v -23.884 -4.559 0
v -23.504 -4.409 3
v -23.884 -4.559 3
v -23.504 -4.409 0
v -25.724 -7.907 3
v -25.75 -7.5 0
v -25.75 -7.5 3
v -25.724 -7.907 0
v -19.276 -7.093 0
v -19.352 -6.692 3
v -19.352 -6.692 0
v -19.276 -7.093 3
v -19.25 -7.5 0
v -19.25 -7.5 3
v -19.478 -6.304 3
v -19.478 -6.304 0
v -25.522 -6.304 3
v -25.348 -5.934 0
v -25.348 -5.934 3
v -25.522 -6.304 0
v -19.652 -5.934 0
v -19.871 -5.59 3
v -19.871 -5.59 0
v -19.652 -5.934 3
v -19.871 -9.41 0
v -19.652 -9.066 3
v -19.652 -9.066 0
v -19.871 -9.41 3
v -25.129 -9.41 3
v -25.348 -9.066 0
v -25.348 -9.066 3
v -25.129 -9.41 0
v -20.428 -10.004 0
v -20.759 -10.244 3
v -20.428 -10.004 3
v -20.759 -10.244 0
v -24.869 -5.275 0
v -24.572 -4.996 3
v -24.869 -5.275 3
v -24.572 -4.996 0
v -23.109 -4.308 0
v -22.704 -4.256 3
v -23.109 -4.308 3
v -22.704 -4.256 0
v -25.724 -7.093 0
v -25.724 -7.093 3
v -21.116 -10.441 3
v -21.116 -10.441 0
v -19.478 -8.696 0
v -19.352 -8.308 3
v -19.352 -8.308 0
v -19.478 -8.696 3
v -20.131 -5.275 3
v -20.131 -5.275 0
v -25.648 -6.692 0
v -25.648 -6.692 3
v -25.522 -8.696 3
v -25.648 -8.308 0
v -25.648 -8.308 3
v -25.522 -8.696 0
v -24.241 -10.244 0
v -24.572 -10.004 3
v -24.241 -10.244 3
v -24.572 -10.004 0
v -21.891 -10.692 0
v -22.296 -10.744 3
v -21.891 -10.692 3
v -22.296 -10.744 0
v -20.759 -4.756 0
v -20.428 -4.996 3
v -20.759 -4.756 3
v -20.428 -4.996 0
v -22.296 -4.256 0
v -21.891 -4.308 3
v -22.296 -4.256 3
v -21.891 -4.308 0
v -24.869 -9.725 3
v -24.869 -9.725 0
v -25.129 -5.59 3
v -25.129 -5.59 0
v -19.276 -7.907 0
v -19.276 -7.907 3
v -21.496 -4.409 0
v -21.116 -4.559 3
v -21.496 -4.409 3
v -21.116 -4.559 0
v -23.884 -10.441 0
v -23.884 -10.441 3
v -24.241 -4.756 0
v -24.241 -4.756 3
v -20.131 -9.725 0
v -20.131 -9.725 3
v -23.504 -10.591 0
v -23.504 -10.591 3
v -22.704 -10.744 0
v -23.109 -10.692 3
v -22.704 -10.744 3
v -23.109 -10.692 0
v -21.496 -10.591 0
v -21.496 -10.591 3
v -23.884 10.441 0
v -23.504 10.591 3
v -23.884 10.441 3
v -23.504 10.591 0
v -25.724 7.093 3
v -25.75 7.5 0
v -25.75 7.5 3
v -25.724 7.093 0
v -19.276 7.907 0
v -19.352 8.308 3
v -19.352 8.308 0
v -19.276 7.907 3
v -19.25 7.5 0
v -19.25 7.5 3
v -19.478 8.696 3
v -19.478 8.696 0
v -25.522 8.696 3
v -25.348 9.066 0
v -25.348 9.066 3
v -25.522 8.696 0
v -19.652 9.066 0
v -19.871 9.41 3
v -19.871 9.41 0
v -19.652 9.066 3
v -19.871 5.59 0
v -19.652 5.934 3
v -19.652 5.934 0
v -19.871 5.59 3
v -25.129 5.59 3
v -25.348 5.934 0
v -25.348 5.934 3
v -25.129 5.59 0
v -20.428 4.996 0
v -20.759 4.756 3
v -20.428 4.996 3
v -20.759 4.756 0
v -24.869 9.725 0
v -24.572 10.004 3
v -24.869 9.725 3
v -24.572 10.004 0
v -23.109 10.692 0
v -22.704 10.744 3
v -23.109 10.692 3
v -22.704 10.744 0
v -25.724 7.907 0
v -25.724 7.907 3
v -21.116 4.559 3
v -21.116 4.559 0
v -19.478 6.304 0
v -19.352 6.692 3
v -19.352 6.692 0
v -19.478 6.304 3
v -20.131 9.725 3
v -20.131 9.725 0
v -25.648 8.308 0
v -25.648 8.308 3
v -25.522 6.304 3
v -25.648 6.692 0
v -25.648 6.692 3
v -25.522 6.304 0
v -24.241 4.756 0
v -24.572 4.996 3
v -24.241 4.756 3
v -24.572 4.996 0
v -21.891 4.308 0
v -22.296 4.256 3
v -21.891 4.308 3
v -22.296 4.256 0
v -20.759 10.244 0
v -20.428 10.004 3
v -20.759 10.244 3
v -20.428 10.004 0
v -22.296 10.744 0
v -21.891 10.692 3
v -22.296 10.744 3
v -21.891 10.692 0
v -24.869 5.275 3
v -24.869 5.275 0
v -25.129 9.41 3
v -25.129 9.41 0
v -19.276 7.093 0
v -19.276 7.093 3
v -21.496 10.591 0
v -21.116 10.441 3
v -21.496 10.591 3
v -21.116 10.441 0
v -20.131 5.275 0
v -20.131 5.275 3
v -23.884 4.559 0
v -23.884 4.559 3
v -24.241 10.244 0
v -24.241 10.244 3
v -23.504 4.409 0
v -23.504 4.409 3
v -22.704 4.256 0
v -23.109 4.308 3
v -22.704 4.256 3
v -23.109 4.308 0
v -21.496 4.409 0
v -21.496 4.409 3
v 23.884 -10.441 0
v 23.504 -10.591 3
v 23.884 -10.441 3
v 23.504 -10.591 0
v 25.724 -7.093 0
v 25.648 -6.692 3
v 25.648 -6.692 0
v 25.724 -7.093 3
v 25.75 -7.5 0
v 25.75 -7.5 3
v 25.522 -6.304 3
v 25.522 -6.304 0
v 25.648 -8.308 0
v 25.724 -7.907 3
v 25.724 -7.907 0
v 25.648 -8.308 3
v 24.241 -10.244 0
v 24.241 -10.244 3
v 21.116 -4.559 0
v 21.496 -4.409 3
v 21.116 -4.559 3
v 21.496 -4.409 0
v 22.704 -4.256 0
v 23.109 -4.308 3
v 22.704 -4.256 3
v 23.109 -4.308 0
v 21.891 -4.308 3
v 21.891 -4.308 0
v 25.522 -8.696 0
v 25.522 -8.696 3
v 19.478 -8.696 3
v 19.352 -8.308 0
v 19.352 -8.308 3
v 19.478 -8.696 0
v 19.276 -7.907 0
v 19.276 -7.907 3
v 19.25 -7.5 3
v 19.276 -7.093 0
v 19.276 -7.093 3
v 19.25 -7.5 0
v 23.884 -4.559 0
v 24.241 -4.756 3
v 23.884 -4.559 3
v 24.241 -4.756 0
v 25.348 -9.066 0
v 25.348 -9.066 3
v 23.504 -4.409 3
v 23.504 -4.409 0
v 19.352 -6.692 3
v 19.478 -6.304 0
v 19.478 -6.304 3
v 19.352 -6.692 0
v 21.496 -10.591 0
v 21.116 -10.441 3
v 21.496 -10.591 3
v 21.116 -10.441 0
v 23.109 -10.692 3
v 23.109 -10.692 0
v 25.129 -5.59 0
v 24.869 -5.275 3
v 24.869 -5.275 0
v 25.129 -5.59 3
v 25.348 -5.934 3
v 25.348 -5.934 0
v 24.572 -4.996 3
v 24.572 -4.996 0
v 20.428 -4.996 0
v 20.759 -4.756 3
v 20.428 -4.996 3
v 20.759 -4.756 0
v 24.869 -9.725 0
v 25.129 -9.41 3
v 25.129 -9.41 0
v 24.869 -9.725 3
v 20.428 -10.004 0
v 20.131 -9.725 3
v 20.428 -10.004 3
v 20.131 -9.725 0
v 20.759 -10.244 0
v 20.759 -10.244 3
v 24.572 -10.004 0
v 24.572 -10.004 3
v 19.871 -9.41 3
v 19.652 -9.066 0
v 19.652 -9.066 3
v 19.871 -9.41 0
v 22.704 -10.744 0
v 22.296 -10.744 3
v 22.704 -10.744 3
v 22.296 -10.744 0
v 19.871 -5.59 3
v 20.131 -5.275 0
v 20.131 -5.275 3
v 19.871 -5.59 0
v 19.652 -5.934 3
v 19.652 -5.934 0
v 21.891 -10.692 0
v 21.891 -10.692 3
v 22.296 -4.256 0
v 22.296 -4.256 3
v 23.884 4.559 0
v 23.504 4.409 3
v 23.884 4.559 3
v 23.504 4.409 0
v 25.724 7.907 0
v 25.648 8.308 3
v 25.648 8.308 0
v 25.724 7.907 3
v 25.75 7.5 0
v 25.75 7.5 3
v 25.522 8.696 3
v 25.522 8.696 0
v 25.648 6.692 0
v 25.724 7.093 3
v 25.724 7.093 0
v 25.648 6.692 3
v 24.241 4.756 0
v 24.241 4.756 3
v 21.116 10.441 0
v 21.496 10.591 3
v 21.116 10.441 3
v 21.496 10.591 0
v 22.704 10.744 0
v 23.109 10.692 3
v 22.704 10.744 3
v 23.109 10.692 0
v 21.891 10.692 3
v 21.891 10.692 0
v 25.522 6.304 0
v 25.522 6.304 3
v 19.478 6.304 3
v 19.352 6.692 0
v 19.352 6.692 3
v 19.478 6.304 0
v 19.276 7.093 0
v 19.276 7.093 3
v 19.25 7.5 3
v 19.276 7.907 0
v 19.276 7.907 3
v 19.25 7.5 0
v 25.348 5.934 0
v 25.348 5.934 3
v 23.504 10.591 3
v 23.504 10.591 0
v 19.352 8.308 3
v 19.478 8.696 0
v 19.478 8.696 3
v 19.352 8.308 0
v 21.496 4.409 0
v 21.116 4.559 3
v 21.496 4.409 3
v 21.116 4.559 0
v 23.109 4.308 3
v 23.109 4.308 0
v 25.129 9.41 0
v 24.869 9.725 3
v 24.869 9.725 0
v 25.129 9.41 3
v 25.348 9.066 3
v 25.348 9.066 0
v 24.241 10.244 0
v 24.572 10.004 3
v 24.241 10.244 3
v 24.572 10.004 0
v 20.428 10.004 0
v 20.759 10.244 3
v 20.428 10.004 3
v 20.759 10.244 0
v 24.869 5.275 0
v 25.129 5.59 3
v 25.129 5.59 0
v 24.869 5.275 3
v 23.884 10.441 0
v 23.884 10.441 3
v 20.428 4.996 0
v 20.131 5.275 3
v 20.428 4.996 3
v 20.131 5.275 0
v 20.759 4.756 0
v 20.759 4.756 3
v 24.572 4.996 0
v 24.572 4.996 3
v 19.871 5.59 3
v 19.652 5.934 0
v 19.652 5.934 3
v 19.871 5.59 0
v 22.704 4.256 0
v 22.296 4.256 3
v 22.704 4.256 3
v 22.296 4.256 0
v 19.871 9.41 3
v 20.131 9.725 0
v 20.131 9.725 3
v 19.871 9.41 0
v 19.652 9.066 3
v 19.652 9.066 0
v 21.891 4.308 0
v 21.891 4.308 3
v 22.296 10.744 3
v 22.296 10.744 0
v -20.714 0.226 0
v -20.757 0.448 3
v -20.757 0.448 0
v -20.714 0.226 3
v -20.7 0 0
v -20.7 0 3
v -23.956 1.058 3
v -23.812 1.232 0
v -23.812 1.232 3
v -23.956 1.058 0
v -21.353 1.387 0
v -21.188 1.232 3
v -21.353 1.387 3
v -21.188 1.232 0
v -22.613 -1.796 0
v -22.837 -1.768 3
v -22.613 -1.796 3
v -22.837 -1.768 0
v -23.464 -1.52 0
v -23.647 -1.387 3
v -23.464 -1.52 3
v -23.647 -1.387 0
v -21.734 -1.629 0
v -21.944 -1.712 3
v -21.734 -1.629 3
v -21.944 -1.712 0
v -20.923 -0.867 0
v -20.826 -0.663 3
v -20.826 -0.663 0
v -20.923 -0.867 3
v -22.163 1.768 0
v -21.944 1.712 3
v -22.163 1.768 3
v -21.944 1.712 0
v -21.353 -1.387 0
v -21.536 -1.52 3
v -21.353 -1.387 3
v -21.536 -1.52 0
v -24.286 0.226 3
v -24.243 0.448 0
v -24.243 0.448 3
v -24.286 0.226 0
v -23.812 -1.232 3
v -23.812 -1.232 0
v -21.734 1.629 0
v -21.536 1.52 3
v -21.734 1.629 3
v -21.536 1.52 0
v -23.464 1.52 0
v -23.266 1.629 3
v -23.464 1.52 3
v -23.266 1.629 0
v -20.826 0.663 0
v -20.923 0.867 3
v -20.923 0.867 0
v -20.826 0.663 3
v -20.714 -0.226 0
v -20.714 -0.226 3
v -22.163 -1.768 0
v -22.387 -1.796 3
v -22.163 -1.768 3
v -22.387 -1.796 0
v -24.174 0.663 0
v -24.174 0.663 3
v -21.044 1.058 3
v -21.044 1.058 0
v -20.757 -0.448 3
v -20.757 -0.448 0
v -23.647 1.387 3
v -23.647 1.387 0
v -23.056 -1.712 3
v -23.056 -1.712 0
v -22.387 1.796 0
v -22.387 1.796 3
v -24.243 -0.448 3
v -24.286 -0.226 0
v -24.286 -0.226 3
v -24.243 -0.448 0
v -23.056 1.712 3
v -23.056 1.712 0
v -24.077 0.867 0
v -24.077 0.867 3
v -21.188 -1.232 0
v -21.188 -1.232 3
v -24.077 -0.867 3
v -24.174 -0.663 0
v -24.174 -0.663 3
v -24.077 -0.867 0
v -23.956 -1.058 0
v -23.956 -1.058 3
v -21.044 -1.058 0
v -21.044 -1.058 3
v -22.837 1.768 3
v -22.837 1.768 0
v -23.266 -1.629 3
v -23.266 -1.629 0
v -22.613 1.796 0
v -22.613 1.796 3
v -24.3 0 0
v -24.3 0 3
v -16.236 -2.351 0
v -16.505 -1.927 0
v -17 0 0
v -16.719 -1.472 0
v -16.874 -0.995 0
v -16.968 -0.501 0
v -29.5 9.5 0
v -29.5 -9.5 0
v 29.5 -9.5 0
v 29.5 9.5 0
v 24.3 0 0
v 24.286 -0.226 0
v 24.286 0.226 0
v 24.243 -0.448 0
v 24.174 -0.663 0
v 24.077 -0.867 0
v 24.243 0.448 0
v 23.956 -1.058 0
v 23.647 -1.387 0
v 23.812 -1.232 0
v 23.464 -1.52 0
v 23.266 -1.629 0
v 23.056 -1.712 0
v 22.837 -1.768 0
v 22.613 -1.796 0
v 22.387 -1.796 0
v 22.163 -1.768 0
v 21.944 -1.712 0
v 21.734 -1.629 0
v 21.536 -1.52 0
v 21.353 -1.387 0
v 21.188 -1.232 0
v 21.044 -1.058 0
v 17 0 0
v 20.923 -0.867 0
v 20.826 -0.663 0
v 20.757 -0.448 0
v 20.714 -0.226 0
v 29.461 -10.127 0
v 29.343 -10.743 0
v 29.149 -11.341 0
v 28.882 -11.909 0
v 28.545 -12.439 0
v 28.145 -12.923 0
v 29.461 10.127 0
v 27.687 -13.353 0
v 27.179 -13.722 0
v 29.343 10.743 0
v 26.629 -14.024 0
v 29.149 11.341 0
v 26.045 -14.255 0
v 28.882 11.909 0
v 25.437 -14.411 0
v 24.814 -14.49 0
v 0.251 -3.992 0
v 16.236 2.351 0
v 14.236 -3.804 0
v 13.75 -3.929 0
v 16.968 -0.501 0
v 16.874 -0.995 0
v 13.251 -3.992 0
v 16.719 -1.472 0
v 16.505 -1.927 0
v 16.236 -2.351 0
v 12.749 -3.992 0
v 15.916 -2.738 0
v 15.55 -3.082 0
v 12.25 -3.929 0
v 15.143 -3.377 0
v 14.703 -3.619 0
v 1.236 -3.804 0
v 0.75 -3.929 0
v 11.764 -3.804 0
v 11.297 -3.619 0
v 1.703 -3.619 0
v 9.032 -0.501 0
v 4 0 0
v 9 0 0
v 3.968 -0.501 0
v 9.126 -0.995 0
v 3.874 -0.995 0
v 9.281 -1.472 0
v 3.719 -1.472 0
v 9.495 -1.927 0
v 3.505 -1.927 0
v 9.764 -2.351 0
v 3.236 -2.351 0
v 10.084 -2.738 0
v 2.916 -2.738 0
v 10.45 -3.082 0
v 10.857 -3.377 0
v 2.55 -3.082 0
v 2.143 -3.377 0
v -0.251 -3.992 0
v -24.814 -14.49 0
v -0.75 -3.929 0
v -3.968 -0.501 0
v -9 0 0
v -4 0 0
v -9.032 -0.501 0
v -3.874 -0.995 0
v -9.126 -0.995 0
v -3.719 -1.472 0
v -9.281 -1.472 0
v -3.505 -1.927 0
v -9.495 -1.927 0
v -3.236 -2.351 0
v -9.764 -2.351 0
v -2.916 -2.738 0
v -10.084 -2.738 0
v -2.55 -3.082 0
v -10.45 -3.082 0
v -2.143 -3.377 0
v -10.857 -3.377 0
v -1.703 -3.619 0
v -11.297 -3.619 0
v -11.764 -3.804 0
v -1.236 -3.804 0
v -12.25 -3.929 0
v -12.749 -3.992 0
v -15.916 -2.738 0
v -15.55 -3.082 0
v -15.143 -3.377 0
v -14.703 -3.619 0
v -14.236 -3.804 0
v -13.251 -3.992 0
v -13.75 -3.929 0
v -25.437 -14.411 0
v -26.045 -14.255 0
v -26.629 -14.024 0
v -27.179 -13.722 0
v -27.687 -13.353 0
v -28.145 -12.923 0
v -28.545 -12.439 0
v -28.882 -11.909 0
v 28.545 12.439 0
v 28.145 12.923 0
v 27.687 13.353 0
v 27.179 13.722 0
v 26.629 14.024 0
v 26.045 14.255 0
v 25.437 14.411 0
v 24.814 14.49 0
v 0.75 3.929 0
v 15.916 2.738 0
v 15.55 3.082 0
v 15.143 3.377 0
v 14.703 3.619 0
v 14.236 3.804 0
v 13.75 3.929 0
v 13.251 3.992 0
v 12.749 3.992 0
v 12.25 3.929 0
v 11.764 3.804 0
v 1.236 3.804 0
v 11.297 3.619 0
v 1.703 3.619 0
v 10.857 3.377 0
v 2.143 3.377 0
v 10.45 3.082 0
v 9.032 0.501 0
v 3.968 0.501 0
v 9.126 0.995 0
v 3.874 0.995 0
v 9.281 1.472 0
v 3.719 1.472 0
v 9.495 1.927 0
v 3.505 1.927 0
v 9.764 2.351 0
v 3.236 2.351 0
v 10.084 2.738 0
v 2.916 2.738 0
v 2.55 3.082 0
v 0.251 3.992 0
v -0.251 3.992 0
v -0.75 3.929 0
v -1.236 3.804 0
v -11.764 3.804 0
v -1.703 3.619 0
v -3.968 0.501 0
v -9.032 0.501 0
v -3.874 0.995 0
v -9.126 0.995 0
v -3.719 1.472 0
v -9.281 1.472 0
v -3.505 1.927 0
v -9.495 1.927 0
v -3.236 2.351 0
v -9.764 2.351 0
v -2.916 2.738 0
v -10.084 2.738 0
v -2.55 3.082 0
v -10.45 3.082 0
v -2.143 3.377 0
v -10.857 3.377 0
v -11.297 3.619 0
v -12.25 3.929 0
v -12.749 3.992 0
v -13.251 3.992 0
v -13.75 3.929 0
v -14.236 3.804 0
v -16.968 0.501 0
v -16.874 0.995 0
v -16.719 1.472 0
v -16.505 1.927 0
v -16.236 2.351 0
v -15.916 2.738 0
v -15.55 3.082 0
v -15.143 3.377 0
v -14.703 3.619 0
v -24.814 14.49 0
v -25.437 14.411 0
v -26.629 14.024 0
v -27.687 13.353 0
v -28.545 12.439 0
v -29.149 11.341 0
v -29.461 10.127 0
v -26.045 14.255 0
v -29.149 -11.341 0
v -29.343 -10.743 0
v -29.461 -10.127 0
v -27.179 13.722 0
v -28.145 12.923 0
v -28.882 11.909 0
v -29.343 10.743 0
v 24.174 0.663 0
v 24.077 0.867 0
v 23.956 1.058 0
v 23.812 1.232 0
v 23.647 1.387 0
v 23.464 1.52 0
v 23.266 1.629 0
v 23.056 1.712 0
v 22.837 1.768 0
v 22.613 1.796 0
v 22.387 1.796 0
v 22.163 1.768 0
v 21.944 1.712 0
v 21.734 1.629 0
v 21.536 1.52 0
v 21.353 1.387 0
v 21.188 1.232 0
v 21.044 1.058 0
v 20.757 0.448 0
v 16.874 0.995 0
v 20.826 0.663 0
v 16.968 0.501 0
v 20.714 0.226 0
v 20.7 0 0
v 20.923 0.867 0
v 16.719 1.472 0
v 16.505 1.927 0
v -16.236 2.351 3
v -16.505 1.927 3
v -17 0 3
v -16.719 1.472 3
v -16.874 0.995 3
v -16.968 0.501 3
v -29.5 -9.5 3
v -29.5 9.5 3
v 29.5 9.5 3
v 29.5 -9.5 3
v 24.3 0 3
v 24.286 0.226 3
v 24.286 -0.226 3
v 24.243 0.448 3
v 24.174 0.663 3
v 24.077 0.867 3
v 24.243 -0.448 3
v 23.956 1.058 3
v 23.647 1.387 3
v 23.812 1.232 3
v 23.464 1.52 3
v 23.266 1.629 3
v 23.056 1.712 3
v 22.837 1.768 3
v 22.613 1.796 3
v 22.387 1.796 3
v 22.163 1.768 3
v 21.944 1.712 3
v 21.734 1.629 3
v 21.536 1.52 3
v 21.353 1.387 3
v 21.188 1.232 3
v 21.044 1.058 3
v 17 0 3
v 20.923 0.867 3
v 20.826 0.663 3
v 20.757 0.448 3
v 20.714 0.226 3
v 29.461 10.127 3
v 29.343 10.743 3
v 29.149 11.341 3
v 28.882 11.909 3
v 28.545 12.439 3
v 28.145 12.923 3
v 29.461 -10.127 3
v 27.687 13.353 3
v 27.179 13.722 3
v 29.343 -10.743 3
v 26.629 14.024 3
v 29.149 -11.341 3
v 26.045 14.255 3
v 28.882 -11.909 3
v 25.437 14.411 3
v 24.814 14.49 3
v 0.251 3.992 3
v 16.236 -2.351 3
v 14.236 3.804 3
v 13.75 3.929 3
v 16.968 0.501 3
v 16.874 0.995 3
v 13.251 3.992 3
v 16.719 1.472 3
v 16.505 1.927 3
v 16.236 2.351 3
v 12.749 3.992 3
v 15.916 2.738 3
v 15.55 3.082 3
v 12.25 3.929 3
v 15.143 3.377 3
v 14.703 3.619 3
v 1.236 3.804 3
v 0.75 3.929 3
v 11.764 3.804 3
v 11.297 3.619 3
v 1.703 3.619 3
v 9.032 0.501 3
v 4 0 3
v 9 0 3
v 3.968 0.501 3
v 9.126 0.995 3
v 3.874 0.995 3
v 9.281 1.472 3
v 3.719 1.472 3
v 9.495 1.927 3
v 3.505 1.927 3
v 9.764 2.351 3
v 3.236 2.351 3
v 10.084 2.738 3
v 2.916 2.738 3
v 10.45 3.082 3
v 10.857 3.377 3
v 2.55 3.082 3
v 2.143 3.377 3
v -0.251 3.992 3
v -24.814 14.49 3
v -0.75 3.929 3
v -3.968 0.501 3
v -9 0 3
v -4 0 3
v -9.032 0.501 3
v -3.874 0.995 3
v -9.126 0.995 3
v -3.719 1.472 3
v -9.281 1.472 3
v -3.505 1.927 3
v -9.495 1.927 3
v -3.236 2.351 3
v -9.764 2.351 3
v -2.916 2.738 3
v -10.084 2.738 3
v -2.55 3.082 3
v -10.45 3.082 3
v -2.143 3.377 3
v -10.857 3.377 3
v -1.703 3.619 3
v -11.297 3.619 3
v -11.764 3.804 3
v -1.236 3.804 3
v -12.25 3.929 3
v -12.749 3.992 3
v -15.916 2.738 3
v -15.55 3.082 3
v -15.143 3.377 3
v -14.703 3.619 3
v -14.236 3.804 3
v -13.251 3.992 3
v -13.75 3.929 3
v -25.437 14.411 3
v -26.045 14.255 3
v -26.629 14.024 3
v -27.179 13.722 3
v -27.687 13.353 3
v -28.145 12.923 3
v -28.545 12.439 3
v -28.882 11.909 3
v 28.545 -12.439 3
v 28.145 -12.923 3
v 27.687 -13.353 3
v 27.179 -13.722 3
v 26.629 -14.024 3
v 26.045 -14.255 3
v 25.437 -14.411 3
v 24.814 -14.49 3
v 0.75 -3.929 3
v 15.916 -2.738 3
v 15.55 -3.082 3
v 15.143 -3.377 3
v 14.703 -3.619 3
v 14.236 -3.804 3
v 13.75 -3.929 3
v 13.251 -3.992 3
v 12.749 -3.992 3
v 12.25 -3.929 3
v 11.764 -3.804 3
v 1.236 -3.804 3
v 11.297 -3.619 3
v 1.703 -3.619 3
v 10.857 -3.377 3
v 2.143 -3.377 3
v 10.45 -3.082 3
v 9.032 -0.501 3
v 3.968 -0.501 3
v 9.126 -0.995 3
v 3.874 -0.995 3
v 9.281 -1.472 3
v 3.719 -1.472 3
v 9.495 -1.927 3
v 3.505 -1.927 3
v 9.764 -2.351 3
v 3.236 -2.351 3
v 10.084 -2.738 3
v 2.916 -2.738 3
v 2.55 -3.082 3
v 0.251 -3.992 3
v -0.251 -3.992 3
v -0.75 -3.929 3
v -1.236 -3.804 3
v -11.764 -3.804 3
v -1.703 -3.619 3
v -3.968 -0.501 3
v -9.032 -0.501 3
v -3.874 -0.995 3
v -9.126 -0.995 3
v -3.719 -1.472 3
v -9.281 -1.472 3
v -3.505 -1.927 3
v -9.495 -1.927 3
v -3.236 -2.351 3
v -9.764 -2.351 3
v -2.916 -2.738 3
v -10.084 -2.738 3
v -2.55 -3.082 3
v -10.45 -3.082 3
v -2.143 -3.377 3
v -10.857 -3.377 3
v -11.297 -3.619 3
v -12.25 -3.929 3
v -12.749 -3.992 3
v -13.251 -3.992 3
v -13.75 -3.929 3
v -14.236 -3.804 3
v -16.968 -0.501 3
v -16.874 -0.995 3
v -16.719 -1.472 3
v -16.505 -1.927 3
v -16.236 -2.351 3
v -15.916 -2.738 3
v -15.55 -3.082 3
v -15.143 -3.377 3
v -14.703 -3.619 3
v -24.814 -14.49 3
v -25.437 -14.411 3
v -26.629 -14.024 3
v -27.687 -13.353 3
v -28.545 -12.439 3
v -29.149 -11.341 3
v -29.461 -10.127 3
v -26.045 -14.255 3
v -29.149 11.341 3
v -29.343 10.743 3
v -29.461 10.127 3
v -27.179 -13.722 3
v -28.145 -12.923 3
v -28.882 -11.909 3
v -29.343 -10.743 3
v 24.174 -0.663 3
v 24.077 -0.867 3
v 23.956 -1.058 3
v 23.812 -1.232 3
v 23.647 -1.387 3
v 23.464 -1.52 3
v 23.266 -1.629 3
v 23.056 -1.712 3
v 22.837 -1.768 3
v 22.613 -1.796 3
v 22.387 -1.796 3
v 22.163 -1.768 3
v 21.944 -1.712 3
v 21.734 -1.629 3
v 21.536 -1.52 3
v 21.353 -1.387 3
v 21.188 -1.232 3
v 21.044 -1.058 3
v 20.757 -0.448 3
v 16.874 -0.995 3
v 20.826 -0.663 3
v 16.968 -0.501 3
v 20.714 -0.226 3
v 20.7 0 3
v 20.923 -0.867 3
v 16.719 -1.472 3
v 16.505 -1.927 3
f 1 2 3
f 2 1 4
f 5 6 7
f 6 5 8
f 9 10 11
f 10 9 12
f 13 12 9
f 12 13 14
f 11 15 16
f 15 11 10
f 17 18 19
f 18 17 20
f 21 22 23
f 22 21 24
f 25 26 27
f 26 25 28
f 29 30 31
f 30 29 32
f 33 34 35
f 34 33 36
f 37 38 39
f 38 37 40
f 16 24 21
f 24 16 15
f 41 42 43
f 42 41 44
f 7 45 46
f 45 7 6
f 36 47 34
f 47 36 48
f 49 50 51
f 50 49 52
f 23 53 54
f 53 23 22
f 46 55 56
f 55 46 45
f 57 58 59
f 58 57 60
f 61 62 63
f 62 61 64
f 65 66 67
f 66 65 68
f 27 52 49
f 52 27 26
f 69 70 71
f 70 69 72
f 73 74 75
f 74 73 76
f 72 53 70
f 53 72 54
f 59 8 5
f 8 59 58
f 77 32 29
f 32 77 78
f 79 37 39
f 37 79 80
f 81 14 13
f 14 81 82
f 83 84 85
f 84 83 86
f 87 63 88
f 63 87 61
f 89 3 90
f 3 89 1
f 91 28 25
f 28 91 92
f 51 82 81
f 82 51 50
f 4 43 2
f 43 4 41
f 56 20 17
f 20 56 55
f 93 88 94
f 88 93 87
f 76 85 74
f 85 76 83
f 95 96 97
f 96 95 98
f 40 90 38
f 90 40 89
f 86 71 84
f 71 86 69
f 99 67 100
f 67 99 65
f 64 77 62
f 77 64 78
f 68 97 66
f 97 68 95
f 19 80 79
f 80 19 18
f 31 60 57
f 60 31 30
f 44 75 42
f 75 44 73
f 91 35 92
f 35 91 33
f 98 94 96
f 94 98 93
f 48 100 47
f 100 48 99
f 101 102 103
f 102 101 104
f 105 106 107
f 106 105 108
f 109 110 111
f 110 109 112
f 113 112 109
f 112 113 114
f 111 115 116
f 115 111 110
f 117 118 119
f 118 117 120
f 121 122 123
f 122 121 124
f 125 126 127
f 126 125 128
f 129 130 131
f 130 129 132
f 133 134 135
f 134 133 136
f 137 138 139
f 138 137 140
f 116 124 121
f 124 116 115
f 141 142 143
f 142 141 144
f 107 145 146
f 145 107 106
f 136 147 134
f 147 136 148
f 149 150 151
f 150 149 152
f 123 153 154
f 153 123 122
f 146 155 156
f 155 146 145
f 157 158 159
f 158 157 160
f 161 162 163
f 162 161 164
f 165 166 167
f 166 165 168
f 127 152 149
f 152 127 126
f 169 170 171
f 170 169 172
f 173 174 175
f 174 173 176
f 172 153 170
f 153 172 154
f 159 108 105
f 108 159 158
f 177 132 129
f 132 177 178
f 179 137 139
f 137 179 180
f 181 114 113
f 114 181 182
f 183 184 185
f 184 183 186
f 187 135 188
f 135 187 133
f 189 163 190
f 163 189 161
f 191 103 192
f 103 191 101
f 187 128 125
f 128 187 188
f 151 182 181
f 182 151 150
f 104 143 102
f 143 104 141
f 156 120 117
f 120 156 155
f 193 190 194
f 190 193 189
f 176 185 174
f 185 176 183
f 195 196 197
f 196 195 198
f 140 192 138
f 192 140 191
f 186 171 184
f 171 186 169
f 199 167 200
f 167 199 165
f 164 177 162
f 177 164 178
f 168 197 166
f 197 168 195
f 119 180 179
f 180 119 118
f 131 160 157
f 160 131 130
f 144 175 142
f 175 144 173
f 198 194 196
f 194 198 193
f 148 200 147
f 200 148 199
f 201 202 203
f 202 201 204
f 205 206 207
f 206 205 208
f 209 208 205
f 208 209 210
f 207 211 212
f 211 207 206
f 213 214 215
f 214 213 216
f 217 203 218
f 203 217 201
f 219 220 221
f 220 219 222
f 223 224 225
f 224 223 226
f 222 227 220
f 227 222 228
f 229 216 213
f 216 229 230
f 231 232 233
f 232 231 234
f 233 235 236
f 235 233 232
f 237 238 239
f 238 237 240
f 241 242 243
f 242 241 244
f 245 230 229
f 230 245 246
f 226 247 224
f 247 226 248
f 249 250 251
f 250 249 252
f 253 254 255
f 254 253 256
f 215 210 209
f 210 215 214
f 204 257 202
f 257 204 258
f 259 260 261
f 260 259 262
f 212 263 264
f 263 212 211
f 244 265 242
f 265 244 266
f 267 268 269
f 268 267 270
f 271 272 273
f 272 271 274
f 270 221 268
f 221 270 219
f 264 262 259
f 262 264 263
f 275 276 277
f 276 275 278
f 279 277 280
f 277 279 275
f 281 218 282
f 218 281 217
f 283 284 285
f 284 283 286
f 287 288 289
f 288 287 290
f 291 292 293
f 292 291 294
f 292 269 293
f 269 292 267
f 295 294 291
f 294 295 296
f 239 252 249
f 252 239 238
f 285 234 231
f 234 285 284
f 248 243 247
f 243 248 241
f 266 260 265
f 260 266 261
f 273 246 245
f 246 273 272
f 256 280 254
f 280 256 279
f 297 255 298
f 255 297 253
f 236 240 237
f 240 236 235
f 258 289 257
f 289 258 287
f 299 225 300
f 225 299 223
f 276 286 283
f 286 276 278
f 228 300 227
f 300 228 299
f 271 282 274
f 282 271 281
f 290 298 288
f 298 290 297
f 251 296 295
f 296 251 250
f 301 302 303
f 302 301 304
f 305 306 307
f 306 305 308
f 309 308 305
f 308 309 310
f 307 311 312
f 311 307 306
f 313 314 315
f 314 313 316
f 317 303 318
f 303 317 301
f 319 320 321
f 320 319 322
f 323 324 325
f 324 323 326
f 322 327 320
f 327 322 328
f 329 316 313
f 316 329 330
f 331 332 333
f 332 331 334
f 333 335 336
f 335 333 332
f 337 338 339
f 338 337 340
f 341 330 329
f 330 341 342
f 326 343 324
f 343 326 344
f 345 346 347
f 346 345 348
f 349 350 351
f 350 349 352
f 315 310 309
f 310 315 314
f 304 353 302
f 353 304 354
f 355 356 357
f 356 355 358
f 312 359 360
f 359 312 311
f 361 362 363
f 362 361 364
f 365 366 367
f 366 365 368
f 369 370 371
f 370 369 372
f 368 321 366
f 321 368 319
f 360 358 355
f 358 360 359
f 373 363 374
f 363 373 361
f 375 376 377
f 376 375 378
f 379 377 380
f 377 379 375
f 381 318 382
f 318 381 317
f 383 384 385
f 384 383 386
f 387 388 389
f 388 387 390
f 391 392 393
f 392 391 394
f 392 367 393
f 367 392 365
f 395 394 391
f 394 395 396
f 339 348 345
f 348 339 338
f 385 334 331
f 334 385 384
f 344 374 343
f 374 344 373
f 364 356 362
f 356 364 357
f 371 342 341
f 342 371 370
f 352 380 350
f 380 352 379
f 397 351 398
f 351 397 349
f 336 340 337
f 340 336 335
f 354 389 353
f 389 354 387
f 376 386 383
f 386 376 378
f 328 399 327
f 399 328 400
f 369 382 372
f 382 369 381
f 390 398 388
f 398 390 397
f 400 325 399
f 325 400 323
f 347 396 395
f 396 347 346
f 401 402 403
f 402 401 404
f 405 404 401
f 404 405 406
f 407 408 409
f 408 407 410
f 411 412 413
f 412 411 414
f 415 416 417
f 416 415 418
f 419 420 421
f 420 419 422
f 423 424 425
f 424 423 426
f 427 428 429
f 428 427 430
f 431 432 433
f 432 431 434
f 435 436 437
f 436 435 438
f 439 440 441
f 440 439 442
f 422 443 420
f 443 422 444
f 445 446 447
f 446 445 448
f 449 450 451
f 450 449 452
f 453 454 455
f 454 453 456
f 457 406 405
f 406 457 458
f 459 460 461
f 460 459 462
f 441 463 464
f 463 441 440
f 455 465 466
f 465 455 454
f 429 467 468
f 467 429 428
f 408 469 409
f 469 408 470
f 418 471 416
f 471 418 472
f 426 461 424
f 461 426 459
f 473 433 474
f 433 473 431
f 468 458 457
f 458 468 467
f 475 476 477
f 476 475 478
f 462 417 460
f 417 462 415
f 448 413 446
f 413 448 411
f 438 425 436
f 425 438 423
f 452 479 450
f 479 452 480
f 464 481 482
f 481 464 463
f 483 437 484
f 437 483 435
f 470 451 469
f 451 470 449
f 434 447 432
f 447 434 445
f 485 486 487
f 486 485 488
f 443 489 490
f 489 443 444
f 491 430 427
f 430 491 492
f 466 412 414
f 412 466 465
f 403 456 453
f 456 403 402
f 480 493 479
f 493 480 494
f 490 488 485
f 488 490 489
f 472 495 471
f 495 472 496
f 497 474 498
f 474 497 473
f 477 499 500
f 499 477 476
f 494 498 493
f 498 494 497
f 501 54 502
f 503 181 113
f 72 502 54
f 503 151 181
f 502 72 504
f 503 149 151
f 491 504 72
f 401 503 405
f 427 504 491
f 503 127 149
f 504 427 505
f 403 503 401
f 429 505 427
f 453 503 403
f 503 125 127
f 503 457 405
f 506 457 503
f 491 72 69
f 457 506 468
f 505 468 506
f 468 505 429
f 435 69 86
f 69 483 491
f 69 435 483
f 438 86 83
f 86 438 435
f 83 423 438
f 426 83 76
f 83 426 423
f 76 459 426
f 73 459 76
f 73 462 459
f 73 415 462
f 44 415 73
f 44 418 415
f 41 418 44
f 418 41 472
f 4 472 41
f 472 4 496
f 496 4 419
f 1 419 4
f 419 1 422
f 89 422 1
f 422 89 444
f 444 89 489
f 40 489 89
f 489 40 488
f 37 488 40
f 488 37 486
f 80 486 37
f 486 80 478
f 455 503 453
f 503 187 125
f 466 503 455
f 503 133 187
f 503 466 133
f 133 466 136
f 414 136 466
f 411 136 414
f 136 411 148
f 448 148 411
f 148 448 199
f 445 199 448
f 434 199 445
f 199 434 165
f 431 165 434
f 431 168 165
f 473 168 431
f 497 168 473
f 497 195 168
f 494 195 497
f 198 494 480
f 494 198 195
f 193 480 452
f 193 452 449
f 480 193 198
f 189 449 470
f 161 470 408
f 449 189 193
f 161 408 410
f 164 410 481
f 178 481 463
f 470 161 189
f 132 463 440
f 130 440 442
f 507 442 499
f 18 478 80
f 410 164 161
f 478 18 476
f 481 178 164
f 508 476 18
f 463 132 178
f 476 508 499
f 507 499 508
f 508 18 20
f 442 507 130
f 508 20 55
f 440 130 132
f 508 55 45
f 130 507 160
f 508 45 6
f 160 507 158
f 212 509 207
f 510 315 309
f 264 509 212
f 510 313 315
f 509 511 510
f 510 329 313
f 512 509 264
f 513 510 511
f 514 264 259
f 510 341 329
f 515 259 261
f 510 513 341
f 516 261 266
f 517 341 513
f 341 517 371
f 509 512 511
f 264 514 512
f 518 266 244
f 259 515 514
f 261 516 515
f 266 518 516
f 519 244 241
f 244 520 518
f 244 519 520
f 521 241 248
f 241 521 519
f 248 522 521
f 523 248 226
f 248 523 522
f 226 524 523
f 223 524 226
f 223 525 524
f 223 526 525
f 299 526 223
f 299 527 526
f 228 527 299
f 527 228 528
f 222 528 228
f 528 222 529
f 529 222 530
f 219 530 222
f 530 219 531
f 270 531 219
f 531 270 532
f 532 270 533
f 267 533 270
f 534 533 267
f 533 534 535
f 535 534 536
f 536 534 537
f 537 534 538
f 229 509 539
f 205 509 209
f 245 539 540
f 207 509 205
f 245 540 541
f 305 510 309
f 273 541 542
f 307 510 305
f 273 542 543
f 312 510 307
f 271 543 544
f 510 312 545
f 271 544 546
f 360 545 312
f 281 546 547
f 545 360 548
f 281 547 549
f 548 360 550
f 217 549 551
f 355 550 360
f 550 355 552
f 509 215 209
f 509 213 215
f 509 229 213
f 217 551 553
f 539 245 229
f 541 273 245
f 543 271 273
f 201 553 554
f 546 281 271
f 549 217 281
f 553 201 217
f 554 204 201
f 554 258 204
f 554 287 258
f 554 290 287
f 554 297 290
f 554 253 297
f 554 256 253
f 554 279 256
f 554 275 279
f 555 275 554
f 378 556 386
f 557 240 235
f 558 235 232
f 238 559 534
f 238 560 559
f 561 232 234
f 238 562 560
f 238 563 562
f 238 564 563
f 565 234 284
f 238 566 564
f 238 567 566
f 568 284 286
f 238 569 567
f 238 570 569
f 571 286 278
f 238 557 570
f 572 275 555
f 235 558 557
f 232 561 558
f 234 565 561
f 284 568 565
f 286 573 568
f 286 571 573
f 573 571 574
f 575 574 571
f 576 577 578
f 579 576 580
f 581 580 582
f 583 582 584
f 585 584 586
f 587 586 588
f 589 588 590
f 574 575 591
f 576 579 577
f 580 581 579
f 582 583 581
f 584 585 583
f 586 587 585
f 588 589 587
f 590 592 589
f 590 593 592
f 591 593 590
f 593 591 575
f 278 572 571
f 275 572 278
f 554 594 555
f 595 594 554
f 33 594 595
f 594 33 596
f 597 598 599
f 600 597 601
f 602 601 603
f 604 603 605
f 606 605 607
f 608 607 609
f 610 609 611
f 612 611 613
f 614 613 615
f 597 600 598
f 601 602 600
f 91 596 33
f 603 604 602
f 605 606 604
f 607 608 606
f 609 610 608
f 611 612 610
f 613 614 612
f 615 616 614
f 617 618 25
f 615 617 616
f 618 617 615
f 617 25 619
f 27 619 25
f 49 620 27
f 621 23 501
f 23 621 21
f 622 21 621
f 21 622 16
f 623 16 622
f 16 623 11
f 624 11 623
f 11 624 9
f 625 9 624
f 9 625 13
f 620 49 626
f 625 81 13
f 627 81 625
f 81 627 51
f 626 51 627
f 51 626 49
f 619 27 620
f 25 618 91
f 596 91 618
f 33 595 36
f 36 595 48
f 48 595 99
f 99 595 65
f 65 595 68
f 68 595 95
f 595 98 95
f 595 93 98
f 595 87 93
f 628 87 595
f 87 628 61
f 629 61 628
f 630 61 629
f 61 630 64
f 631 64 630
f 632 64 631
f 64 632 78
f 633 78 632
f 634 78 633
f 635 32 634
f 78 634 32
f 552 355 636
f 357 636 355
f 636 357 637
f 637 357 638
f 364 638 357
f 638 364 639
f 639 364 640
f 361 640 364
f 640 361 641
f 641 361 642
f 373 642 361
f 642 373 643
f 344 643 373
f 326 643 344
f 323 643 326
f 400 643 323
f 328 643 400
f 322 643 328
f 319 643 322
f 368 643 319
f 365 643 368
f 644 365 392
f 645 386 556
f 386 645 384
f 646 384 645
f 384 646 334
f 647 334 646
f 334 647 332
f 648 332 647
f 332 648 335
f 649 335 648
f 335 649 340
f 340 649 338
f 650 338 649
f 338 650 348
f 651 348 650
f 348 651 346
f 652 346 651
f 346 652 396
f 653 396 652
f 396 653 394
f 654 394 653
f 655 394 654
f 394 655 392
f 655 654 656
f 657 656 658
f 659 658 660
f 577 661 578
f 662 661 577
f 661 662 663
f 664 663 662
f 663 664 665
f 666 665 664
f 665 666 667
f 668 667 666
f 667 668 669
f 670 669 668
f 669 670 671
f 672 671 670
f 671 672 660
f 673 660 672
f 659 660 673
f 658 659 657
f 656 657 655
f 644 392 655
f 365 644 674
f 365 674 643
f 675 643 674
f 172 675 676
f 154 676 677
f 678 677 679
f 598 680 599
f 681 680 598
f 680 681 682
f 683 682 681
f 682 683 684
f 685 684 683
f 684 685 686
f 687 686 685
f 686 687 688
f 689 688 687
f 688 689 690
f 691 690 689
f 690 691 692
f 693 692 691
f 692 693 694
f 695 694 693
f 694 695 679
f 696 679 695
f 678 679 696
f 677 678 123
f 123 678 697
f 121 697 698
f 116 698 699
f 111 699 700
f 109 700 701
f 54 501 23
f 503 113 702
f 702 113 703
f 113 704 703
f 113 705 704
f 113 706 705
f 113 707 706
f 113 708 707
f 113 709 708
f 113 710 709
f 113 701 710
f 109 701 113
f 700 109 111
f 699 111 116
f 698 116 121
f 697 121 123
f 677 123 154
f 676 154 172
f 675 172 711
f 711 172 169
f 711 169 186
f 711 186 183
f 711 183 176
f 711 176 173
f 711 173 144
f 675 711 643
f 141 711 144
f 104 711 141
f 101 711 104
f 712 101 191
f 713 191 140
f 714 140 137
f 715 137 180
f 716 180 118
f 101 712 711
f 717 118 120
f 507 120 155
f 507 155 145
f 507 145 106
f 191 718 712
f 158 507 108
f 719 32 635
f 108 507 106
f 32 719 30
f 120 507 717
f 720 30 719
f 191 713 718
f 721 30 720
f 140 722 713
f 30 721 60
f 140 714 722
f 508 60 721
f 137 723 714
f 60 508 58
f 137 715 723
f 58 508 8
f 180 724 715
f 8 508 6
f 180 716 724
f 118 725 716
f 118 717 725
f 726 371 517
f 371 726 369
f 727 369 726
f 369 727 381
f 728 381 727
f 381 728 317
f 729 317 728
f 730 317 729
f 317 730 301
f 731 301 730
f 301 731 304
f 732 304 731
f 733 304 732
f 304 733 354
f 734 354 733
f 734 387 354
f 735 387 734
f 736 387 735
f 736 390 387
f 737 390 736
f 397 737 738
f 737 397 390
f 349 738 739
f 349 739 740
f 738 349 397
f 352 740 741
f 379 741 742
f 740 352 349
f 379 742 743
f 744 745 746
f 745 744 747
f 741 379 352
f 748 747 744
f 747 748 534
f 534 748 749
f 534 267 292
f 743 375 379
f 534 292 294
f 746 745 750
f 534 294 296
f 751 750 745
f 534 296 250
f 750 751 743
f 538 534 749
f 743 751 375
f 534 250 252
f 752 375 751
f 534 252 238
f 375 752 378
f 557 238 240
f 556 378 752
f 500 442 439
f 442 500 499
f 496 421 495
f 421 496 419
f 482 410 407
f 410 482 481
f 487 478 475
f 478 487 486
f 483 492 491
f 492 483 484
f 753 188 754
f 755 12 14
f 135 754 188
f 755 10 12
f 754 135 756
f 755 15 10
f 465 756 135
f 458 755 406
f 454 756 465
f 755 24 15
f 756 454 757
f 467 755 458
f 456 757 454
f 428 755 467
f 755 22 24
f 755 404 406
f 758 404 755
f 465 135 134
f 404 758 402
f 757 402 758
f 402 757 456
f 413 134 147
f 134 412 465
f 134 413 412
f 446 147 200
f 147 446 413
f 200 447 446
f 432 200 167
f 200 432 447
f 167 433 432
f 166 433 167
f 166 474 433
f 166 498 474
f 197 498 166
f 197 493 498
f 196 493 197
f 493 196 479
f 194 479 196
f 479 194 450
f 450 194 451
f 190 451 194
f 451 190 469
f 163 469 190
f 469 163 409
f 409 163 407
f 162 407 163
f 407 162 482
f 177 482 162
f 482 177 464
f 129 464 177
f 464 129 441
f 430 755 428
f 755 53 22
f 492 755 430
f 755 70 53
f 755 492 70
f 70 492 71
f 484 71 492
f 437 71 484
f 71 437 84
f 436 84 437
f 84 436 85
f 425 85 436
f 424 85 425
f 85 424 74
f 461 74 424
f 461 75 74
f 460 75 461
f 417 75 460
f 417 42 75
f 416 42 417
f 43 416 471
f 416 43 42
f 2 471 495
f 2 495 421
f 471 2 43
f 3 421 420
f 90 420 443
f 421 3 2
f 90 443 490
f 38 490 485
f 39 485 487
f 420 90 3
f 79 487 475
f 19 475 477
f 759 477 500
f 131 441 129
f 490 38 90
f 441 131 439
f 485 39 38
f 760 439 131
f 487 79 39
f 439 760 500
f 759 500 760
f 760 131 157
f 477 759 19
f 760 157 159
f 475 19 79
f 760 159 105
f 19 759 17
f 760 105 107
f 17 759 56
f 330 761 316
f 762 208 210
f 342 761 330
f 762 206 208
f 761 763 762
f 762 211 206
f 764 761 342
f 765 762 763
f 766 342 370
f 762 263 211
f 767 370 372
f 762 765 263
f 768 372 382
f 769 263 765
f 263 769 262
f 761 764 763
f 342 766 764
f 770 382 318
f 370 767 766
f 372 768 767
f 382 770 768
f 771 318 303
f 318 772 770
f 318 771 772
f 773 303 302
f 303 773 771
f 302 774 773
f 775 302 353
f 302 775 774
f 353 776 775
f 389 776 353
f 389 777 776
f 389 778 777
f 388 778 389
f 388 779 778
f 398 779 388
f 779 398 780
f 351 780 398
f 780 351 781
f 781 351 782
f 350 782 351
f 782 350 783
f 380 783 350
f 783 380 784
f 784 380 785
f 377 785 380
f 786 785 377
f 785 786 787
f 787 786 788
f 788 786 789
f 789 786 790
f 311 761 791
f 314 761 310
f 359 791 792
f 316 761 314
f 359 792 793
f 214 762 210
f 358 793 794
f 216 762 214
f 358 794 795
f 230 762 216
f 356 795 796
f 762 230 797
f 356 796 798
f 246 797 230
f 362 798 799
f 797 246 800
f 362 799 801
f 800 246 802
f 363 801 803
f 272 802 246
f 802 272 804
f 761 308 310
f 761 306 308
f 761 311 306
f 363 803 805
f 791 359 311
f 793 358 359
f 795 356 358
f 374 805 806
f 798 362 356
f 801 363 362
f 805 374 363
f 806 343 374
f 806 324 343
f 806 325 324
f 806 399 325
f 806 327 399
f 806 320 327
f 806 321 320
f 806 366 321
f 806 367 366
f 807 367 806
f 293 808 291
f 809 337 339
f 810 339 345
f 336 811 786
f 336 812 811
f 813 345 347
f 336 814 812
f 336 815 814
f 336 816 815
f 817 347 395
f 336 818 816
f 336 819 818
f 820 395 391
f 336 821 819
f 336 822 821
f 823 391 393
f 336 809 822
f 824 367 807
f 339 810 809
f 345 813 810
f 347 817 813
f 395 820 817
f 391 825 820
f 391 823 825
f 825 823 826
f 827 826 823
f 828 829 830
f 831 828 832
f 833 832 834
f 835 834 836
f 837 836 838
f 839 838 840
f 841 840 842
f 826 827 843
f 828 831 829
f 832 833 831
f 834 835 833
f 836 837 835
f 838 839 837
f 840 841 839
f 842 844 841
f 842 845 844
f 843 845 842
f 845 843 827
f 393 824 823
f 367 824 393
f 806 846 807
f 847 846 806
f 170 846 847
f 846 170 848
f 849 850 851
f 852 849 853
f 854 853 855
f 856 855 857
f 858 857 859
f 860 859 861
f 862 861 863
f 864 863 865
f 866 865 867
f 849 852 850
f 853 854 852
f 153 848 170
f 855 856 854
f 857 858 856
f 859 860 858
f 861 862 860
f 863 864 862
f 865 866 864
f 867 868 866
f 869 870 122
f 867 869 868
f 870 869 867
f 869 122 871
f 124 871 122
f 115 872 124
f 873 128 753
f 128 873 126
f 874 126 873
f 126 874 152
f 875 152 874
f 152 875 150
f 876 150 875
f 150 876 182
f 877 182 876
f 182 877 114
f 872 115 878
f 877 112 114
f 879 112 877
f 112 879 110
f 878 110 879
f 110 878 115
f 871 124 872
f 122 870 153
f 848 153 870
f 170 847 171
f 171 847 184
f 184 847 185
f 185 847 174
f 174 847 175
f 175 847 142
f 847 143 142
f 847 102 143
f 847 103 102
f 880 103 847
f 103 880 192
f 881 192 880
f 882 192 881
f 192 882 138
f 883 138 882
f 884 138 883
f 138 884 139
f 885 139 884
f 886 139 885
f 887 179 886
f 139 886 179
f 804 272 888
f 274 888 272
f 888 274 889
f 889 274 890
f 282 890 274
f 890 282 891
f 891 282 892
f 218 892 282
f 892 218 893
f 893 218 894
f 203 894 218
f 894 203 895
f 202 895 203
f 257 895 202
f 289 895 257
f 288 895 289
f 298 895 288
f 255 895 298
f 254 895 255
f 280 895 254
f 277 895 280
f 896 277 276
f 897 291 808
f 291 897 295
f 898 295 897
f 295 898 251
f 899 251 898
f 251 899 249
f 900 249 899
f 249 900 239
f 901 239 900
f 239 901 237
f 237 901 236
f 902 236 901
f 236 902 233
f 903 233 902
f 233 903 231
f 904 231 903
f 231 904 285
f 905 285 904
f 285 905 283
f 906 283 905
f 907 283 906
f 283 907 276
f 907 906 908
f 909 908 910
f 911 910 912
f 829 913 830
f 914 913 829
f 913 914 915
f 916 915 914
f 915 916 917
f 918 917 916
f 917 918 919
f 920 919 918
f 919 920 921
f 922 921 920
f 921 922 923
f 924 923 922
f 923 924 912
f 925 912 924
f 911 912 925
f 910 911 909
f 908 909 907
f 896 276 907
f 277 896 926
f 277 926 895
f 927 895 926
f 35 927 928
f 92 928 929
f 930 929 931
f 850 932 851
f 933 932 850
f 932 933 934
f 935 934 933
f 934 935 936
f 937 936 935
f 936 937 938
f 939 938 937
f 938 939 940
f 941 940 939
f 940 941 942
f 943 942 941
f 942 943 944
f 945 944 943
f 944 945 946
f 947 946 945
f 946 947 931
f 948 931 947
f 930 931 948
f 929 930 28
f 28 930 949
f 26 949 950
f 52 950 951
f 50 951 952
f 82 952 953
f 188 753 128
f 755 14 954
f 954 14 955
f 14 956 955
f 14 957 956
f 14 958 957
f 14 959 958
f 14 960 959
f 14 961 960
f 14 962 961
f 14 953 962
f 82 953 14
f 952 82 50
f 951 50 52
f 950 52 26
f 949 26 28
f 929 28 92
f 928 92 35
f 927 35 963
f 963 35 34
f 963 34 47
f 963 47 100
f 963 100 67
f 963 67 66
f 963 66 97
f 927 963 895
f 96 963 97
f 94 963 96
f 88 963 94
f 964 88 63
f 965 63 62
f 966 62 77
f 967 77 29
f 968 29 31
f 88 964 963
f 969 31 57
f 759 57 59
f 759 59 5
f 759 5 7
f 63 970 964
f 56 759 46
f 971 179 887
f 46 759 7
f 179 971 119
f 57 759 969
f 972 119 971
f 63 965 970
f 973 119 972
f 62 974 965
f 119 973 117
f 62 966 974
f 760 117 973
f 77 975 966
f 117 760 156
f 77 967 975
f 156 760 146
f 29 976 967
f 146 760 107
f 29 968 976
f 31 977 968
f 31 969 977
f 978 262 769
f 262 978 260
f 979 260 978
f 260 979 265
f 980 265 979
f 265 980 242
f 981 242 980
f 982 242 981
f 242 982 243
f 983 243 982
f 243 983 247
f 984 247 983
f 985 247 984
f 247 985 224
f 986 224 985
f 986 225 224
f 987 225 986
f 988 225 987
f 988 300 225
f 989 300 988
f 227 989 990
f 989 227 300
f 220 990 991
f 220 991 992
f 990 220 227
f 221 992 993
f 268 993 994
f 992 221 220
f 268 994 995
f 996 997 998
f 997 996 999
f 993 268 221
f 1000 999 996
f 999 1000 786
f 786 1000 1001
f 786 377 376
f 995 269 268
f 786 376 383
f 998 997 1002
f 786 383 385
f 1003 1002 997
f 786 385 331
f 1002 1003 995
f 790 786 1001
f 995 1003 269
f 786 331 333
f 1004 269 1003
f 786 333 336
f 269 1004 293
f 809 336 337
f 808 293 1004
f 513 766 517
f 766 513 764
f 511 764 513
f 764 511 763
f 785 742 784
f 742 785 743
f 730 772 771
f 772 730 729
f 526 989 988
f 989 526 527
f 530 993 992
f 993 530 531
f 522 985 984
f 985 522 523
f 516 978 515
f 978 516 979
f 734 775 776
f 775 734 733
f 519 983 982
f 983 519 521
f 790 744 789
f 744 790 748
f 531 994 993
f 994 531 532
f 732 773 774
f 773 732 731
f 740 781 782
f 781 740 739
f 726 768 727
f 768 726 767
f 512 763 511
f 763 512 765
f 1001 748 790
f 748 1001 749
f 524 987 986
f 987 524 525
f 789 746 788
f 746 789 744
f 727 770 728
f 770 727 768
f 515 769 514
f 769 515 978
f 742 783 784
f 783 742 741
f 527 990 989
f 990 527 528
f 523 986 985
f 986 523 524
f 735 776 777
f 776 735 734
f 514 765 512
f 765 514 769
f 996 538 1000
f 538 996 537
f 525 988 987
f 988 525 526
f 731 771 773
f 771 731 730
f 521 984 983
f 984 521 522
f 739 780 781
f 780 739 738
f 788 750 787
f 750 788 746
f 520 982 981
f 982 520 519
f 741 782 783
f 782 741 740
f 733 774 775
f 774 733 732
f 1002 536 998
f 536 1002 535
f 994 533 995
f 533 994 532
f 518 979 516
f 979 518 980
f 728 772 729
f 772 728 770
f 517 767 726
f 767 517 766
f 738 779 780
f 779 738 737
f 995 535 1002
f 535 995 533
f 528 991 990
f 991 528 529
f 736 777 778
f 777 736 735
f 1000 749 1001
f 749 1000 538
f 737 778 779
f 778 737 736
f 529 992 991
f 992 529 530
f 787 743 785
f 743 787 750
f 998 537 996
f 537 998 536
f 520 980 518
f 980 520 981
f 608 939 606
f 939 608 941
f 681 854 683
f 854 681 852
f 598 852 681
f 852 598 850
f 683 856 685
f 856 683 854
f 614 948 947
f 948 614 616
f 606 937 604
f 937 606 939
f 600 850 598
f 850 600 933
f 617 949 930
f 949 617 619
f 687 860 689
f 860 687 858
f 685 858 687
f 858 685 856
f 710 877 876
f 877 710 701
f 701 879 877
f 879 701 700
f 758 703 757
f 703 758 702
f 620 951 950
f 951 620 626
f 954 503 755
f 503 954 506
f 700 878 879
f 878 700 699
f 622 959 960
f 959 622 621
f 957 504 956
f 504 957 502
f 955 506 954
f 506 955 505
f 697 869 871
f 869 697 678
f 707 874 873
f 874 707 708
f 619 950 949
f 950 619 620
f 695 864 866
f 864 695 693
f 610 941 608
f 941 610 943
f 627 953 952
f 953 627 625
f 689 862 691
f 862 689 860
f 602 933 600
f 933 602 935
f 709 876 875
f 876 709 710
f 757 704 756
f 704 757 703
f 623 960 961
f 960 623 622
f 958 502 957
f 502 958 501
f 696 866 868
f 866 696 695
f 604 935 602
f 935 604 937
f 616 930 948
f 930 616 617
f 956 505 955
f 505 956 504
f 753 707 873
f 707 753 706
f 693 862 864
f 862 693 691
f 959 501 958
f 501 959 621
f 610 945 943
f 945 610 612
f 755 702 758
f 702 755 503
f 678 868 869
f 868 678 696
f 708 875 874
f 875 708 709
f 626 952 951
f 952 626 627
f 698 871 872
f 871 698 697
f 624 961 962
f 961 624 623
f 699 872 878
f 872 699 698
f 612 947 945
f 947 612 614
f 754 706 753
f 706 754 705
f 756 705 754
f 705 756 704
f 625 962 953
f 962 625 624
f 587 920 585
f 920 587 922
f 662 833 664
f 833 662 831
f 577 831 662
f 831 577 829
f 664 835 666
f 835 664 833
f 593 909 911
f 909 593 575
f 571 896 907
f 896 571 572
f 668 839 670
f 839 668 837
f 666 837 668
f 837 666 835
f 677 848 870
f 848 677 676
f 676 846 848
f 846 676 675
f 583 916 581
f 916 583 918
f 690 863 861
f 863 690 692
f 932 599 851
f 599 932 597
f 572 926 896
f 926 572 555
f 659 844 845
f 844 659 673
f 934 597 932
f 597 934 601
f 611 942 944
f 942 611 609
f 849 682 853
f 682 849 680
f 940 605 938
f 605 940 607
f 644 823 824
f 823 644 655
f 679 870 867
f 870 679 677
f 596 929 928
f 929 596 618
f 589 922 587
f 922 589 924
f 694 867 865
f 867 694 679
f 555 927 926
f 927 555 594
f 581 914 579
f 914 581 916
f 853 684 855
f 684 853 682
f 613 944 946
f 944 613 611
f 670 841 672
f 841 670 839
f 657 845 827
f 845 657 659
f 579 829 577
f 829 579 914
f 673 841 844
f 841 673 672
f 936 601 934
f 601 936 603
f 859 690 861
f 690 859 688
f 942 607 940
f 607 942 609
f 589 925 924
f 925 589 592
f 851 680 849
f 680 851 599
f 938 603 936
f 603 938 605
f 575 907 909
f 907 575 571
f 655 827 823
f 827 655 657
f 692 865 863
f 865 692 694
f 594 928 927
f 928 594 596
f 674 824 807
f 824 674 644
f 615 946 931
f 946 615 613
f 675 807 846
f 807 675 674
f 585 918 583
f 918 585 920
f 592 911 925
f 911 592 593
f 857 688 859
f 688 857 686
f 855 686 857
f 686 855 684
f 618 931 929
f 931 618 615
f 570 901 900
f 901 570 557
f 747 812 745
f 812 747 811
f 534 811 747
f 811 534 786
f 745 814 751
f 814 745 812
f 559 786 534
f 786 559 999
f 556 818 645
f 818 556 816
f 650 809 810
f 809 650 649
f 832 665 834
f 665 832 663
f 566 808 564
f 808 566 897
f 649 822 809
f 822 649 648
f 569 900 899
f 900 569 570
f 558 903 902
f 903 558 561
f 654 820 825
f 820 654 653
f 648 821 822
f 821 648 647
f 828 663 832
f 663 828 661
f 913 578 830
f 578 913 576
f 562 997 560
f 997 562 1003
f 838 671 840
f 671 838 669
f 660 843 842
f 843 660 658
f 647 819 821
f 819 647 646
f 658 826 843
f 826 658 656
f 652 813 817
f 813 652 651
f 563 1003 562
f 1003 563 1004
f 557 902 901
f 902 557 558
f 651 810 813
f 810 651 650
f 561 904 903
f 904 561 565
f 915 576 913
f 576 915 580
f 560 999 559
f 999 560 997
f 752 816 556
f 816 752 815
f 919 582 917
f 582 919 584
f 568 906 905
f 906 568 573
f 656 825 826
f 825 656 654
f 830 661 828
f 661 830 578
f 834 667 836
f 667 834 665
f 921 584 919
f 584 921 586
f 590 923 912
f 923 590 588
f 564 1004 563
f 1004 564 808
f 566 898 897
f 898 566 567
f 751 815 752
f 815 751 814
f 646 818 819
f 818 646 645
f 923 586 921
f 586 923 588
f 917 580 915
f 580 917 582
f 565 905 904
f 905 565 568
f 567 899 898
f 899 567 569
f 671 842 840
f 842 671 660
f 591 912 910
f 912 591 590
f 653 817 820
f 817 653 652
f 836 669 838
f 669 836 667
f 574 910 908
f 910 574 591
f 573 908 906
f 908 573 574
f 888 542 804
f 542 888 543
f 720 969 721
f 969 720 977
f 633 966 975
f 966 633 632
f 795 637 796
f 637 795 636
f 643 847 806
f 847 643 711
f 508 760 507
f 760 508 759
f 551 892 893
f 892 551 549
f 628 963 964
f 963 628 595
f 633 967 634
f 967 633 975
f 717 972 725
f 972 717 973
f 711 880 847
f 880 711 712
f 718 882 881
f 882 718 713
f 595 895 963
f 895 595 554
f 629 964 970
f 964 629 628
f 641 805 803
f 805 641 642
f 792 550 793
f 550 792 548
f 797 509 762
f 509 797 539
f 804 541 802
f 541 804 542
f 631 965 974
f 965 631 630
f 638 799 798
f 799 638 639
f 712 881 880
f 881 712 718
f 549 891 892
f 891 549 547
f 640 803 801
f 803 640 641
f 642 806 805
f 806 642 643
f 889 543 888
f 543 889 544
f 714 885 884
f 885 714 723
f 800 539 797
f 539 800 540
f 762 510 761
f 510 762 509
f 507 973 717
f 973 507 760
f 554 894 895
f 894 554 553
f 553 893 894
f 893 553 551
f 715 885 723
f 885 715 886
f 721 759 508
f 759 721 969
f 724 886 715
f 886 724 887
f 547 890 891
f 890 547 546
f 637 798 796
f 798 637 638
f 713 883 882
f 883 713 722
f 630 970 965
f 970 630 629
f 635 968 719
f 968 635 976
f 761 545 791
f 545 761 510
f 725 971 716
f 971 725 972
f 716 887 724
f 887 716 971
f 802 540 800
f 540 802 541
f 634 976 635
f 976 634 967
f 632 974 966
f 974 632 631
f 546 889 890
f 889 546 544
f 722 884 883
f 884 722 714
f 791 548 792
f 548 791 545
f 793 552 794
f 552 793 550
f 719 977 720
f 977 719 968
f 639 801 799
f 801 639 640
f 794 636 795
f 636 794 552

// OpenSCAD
$fn = 50;


difference() {
	union() {
		hull() {
			translate(v = [-24.5000000000, 9.5000000000, 0]) {
				cylinder(h = 3, r = 5);
			}
			translate(v = [24.5000000000, 9.5000000000, 0]) {
				cylinder(h = 3, r = 5);
			}
			translate(v = [-24.5000000000, -9.5000000000, 0]) {
				cylinder(h = 3, r = 5);
			}
			translate(v = [24.5000000000, -9.5000000000, 0]) {
				cylinder(h = 3, r = 5);
			}
		}
	}
	union() {
		#translate(v = [-22.5000000000, -7.5000000000, 0]) {
			cylinder(h = 3, r = 3.2500000000);
		}
		#translate(v = [-22.5000000000, 7.5000000000, 0]) {
			cylinder(h = 3, r = 3.2500000000);
		}
		#translate(v = [22.5000000000, -7.5000000000, 0]) {
			cylinder(h = 3, r = 3.2500000000);
		}
		#translate(v = [22.5000000000, 7.5000000000, 0]) {
			cylinder(h = 3, r = 3.2500000000);
		}
		#translate(v = [-22.5000000000, -7.5000000000, -100.0000000000]) {
			cylinder(h = 200, r = 3.2500000000);
		}
		#translate(v = [-22.5000000000, 7.5000000000, -100.0000000000]) {
			cylinder(h = 200, r = 3.2500000000);
		}
		#translate(v = [22.5000000000, -7.5000000000, -100.0000000000]) {
			cylinder(h = 200, r = 3.2500000000);
		}
		#translate(v = [22.5000000000, 7.5000000000, -100.0000000000]) {
			cylinder(h = 200, r = 3.2500000000);
		}
		#translate(v = [-22.5000000000, -7.5000000000, 0]) {
			cylinder(h = 3, r = 1.8000000000);
		}
		#translate(v = [-22.5000000000, 0.0000000000, 0]) {
			cylinder(h = 3, r = 1.8000000000);
		}
		#translate(v = [-22.5000000000, 7.5000000000, 0]) {
			cylinder(h = 3, r = 1.8000000000);
		}
		#translate(v = [22.5000000000, -7.5000000000, 0]) {
			cylinder(h = 3, r = 1.8000000000);
		}
		#translate(v = [22.5000000000, 0.0000000000, 0]) {
			cylinder(h = 3, r = 1.8000000000);
		}
		#translate(v = [22.5000000000, 7.5000000000, 0]) {
			cylinder(h = 3, r = 1.8000000000);
		}
		#translate(v = [-22.5000000000, -7.5000000000, 0]) {
			cylinder(h = 3, r = 1.8000000000);
		}
		#translate(v = [-22.5000000000, 0.0000000000, 0]) {
			cylinder(h = 3, r = 1.8000000000);
		}
		#translate(v = [-22.5000000000, 7.5000000000, 0]) {
			cylinder(h = 3, r = 1.8000000000);
		}
		#translate(v = [22.5000000000, -7.5000000000, 0]) {
			cylinder(h = 3, r = 1.8000000000);
		}
		#translate(v = [22.5000000000, 0.0000000000, 0]) {
			cylinder(h = 3, r = 1.8000000000);
		}
		#translate(v = [22.5000000000, 7.5000000000, 0]) {
			cylinder(h = 3, r = 1.8000000000);
		}
		#translate(v = [-22.5000000000, -7.5000000000, 0]) {
			cylinder(h = 3, r = 1.8000000000);
		}
		#translate(v = [-22.5000000000, 0.0000000000, 0]) {
			cylinder(h = 3, r = 1.8000000000);
		}
		#translate(v = [-22.5000000000, 7.5000000000, 0]) {
			cylinder(h = 3, r = 1.8000000000);
		}
		#translate(v = [22.5000000000, -7.5000000000, 0]) {
			cylinder(h = 3, r = 1.8000000000);
		}
		#translate(v = [22.5000000000, 0.0000000000, 0]) {
			cylinder(h = 3, r = 1.8000000000);
		}
		#translate(v = [22.5000000000, 7.5000000000, 0]) {
			cylinder(h = 3, r = 1.8000000000);
		}
		#translate(v = [-13.0000000000, 0, 0]) {
			cylinder(h = 3, r = 4.0000000000);
		}
		#cylinder(h = 3, r = 4.0000000000);
		#translate(v = [13.0000000000, 0, 0]) {
			cylinder(h = 3, r = 4.0000000000);
		}
	}
}
